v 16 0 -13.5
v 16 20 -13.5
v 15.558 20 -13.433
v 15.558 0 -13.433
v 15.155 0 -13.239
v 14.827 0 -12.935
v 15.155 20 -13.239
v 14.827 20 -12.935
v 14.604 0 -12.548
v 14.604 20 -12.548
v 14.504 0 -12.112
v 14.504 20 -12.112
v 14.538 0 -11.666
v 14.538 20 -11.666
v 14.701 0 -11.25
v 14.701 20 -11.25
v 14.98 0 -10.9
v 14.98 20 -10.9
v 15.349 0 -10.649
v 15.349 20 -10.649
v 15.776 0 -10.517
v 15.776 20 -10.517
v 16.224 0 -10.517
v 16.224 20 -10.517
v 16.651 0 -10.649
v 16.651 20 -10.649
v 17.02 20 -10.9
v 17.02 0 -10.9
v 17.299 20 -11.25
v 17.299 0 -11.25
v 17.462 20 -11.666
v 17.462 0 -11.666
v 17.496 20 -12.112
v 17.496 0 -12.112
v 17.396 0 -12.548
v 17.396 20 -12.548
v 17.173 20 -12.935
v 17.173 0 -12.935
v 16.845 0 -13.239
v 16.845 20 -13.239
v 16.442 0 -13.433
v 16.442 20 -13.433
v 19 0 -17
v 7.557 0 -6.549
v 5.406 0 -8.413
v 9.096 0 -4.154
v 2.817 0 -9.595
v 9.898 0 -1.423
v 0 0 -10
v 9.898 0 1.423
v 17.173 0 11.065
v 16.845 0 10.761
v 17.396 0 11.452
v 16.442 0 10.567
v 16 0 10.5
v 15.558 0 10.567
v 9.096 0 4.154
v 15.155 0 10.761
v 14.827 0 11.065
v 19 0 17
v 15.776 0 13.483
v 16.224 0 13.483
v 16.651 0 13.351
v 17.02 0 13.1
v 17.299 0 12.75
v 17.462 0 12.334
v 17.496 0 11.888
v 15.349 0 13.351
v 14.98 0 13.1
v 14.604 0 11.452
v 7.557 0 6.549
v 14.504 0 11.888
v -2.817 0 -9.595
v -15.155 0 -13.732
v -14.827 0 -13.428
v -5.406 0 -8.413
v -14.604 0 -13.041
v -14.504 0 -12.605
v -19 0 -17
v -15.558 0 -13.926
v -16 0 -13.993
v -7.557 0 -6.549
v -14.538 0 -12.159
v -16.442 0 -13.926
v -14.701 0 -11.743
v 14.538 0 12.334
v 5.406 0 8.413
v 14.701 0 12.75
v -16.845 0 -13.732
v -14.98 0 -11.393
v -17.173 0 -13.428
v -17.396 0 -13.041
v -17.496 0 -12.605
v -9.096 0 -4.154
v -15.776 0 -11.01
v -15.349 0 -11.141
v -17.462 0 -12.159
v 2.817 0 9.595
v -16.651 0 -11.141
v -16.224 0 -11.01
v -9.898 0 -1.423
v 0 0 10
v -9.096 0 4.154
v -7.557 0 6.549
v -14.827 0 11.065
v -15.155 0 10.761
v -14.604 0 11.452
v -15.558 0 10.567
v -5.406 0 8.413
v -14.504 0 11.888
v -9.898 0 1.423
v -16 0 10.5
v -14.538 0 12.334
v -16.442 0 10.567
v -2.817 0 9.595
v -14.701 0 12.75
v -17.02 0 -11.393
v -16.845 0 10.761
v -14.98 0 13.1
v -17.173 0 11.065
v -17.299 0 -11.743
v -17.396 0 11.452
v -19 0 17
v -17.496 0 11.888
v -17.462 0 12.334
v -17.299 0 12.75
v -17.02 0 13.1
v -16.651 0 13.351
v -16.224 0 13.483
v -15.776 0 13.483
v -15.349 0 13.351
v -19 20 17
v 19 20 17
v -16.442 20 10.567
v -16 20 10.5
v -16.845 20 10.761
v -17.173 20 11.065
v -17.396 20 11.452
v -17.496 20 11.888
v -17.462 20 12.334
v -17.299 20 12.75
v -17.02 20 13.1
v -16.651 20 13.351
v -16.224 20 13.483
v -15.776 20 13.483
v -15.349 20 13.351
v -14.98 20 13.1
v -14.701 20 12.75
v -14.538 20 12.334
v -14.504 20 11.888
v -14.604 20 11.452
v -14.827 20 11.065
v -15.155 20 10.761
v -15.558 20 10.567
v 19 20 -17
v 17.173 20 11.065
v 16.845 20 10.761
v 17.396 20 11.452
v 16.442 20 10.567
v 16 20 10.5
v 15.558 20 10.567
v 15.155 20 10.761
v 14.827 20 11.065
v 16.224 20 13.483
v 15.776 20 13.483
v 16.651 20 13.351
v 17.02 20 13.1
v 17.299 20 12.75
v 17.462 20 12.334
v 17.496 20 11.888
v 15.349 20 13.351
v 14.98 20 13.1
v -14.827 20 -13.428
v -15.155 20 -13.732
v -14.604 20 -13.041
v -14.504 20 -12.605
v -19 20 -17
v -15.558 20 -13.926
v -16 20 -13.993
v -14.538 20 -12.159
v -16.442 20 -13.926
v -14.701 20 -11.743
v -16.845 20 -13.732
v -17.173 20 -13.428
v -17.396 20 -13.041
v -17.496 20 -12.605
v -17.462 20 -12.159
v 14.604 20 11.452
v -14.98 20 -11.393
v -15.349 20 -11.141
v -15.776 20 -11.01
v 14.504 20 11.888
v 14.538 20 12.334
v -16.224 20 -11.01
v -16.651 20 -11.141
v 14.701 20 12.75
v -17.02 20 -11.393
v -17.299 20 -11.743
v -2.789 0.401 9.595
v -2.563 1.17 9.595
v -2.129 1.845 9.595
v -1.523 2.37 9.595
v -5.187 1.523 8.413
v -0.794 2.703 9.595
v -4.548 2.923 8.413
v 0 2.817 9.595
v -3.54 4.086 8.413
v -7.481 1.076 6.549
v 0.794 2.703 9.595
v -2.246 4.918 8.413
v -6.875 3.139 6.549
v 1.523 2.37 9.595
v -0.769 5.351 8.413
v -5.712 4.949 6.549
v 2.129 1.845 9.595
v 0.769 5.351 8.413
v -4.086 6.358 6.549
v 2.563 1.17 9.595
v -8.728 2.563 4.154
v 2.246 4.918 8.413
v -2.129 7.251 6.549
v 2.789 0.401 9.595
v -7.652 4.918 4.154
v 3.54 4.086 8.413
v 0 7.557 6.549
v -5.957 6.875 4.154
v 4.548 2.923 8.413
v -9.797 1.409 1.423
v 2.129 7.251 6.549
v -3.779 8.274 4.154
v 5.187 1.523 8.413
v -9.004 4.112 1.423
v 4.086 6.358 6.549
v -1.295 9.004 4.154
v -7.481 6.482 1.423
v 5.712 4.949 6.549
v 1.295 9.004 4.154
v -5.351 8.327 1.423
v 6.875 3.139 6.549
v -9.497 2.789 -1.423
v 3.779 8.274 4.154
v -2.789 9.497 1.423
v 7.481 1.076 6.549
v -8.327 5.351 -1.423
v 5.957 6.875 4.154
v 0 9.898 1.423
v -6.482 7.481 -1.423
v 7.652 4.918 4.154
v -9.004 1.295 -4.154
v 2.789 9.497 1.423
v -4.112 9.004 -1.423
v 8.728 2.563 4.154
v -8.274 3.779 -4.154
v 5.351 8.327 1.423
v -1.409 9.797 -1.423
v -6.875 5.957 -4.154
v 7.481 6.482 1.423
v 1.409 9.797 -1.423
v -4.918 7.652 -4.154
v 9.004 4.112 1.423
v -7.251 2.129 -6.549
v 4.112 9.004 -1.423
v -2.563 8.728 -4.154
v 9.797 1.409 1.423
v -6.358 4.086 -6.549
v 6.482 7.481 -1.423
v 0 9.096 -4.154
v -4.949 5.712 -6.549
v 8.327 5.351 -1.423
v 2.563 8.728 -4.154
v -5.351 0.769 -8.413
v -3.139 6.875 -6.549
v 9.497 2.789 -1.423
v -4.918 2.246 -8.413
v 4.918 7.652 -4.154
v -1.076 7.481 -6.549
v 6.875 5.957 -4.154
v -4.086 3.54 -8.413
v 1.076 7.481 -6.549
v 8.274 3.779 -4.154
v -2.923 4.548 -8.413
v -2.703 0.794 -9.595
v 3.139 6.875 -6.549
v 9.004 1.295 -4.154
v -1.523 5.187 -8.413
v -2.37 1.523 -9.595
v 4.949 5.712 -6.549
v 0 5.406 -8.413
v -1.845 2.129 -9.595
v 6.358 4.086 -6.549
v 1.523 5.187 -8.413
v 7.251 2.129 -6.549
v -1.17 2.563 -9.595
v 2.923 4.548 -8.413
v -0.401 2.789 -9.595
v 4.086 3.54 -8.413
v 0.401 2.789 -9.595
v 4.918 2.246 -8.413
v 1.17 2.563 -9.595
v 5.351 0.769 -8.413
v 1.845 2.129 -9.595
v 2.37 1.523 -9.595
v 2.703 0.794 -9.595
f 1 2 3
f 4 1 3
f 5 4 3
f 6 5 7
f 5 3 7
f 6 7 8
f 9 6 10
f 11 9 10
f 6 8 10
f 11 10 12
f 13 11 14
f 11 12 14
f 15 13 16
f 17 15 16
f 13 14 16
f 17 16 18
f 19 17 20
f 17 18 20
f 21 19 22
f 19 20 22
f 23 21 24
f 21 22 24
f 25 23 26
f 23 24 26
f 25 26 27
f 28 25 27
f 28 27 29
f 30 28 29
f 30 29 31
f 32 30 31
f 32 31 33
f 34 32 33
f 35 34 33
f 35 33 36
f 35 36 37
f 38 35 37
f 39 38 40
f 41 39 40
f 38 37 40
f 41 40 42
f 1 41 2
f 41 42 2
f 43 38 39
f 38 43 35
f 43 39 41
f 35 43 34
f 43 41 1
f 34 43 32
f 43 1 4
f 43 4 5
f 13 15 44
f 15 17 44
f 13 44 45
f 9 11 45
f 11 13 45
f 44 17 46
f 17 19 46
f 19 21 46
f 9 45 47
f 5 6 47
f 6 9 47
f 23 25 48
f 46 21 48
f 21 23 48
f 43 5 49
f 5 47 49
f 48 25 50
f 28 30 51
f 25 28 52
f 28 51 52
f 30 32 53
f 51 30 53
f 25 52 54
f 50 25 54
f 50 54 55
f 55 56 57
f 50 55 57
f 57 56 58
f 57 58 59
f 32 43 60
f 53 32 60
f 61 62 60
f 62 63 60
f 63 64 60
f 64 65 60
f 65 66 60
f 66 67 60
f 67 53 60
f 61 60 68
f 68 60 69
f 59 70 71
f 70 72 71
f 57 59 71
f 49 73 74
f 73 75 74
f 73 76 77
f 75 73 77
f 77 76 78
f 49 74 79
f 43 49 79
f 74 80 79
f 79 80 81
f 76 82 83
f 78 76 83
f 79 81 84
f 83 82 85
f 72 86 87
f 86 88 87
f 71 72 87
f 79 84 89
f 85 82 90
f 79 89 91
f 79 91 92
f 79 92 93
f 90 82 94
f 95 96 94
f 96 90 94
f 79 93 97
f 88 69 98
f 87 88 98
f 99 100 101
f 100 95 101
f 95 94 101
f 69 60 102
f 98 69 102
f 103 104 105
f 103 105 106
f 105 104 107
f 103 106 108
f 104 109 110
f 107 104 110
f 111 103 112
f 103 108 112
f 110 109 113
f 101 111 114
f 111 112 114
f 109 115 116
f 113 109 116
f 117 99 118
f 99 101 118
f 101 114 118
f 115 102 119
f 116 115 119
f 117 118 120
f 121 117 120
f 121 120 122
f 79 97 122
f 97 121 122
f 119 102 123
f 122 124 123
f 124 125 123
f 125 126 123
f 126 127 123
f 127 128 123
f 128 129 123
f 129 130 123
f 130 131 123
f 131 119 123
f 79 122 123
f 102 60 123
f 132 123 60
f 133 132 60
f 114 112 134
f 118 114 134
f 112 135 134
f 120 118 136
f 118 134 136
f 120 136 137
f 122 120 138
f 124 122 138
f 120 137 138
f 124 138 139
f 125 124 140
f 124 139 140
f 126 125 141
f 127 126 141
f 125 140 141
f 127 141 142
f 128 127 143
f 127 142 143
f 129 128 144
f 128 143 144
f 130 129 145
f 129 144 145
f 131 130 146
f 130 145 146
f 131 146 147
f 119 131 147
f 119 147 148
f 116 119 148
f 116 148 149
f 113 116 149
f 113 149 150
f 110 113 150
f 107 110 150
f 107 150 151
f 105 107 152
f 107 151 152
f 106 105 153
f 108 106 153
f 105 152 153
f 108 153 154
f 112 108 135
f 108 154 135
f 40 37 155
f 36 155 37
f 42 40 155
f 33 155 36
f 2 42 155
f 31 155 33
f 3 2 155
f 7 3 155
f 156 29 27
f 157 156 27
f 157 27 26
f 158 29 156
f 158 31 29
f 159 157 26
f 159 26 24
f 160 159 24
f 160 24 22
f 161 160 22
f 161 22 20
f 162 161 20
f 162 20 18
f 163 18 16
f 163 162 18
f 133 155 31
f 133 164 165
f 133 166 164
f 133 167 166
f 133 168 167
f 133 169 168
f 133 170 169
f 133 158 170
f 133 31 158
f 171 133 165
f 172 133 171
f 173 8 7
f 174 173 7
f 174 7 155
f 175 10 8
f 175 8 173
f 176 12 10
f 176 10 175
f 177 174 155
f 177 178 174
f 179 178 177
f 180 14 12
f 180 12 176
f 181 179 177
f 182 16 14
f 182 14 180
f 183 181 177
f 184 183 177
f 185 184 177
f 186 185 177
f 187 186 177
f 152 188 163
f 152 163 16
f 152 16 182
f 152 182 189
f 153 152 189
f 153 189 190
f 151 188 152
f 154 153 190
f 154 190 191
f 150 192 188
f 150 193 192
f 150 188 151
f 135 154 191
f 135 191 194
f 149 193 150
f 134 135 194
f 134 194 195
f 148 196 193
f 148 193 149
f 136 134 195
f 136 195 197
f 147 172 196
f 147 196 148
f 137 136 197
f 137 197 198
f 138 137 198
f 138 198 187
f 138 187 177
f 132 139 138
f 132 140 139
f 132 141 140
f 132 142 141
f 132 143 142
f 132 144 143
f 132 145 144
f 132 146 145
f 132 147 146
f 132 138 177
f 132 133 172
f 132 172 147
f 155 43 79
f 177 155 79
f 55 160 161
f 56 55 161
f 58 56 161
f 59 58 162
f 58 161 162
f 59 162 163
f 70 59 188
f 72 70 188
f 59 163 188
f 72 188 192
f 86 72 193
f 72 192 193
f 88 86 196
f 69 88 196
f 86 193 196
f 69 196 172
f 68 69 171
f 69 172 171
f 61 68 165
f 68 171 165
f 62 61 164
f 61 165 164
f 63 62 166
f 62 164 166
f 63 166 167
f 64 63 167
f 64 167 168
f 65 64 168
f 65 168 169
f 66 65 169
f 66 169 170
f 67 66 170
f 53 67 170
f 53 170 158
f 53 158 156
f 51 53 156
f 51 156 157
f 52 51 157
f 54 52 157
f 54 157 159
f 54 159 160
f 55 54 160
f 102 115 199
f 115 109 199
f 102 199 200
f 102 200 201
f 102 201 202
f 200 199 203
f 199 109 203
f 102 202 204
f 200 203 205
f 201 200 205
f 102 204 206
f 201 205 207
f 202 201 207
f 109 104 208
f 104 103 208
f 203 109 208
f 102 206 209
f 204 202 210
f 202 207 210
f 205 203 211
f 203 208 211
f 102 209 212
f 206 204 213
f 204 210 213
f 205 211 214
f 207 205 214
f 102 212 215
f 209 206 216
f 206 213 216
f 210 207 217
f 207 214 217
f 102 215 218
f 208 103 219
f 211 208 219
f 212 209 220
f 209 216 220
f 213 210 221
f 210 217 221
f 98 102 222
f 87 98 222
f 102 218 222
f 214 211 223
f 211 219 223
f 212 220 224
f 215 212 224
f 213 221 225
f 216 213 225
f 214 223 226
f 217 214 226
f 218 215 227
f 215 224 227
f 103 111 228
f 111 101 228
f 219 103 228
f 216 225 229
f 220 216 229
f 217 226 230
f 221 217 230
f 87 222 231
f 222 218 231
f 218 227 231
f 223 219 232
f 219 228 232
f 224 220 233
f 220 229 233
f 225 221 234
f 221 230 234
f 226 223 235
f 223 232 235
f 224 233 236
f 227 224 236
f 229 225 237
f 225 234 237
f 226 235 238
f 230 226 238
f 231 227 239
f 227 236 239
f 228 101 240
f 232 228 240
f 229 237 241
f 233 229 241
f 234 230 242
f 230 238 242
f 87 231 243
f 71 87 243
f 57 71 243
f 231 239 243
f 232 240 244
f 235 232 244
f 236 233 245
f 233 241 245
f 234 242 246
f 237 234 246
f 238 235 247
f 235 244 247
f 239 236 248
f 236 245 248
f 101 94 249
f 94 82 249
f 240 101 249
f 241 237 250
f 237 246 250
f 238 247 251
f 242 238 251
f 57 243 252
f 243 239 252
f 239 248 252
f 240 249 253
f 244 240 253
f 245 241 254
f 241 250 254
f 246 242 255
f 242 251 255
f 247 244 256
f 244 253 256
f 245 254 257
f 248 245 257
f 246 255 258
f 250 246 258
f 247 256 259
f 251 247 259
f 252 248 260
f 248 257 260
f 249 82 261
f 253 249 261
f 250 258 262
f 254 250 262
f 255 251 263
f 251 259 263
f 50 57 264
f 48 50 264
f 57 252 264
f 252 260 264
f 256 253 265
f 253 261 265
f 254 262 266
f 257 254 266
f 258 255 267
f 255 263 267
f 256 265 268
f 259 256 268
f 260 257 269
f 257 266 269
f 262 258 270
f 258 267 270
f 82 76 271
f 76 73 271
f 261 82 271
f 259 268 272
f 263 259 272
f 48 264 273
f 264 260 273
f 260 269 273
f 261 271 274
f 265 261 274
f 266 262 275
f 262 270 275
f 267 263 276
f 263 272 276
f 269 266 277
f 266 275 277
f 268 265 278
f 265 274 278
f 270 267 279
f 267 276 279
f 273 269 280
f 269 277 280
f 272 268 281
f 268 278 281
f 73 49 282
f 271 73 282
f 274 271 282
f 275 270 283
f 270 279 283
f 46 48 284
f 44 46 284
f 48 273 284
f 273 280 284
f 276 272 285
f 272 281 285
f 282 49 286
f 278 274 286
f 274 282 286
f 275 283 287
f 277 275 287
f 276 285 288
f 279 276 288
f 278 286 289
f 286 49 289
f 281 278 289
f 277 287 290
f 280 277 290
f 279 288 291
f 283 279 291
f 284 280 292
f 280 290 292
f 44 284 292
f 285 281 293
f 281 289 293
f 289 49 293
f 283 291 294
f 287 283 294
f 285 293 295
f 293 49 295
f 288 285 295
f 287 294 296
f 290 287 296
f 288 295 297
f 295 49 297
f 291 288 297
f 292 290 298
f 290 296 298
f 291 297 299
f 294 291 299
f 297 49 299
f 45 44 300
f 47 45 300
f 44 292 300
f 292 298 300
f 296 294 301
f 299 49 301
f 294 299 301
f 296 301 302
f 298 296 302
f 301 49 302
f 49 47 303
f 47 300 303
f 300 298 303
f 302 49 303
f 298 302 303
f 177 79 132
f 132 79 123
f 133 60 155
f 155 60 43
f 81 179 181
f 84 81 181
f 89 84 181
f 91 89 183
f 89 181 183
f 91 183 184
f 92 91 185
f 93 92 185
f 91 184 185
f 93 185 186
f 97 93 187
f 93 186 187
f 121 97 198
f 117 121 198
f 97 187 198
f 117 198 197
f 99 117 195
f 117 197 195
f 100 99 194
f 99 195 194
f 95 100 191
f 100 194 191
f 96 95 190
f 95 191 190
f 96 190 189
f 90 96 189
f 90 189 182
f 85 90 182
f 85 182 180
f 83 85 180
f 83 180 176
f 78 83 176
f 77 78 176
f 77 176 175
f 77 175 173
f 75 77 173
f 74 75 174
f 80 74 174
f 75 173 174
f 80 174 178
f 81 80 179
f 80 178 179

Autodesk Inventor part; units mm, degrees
ref_plane "YZ Plane" through (0, 0, 0) normal (1, 0, 0) x (0, 1, 0)
ref_plane "XZ Plane" through (0, 0, 0) normal (0, 1, 0) x (-1, 0, 0)
ref_plane "XY Plane" through (0, 0, 0) normal (0, 0, 1) x (1, 0, 0)
sketch "Sketch1" plane through (0, 0, 0) normal (0, 1, 0) x (-1, 0, 0)
  line L0 (-19, -17) -> (19, -17)
  line L1 (19, -17) -> (19, 17)
  line L2 (19, 17) -> (-19, 17)
  line L3 (-19, 17) -> (-19, -17)
  line L4 (-19, -17) -> (19, 17) construction
  line L5 (19, -17) -> (-19, 17) construction
  point P0 (0, 0)
  dimension "d0" = 38
  dimension "d1" = 34
extrude "Extrusion1" add sketch "Sketch1" along normal blind 20
sketch "Sketch2" plane through (0, 0, 0) normal (0, -1, 0) x (1, 0, 0)
  arc A0 (0, 10) -> (0, -10) centre (0, 0) ccw
  line L0 (0, 10) -> (0, -23.7919) construction
  line L1 (0, -10) -> (0, 10)
  dimension "d4" = 20
revolve "Revolution1" cut sketch "Sketch2" angle 180 about axis through (0, 0, 10) along (0, 0, -1)
sketch "Sketch3" plane through (0, 0, 0) normal (0, -1, 0) x (1, 0, 0)
  point P0 (0, 0)
  point P1 (16, 12)
  point P2 (16, -12)
  point P3 (-16, -12.4929)
  point P4 (-16, 12)
hole "Hole1" at (-16, 0, -12.4929) at (-16, 0, 12) at (16, 0, 12) at (16, 0, -12) direction (0, 1, 0) diameter 3 end through all
properties part number "Box"
